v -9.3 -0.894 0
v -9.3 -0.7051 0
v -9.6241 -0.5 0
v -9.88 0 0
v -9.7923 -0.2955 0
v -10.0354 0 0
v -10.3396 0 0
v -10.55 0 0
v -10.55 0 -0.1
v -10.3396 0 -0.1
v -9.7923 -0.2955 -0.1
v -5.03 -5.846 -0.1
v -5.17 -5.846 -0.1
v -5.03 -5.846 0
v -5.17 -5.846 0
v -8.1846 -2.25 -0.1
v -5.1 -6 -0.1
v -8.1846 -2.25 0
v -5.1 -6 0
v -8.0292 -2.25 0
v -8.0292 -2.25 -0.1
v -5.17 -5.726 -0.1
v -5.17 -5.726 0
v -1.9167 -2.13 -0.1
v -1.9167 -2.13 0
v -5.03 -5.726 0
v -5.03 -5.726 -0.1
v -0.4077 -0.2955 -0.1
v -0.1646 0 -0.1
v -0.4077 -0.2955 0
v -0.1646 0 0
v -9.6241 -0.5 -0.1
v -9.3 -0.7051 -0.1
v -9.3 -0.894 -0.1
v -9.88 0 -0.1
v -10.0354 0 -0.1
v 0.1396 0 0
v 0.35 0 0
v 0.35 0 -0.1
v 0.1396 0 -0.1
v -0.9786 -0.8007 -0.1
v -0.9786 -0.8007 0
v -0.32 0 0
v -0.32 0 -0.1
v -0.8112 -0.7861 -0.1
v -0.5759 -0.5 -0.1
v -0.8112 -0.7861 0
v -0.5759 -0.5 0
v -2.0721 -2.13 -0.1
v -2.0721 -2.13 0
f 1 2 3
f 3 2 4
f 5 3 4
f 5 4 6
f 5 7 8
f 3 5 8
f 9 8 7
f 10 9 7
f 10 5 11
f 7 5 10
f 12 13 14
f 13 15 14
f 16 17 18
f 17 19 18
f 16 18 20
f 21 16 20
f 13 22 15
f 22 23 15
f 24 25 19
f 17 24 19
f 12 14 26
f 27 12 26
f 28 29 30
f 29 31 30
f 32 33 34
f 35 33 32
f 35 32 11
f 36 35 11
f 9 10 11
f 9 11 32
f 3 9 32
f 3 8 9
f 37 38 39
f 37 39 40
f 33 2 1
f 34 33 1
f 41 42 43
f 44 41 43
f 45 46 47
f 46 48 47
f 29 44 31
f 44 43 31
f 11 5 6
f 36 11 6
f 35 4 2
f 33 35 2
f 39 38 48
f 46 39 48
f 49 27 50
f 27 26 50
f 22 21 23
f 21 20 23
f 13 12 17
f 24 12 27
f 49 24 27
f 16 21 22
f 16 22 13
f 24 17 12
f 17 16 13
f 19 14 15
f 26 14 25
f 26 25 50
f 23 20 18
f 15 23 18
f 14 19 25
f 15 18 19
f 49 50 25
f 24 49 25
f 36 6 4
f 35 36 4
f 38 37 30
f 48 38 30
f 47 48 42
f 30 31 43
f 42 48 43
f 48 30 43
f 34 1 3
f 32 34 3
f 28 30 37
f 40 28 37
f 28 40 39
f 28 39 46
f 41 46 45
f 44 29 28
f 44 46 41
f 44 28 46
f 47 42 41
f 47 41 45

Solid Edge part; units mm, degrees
sketch "Sketch1" plane through (0, 0, 0) normal (0, 0, 1) x (1, 0, 0)
  line L0 (-9.3, -0.894) -> (-10.0354, 0)
  line L1 (-10.0354, 0) -> (-9.88, 0)
  line L2 (-9.88, 0) -> (-9.3, -0.7051)
  line L3 (-9.3, -0.7051) -> (-9.3, -0.894)
  line L4 (-0.32, 0) -> (-0.1646, 0)
  line L5 (-0.1646, 0) -> (-0.8112, -0.7861)
  line L6 (-0.9786, -0.8007) -> (-0.8112, -0.7861)
  line L7 (-0.9786, -0.8007) -> (-0.32, 0)
  line L8 (-1.9167, -2.13) -> (-5.1, -6)
  line L9 (-5.1, -6) -> (-8.1846, -2.25)
  line L10 (-8.1846, -2.25) -> (-8.0292, -2.25)
  line L11 (-8.0292, -2.25) -> (-5.17, -5.726)
  line L12 (-5.17, -5.726) -> (-5.17, -5.846)
  line L13 (-5.17, -5.846) -> (-5.03, -5.846)
  line L14 (-5.03, -5.846) -> (-5.03, -5.726)
  line L15 (-5.03, -5.726) -> (-2.0721, -2.13)
  line L16 (-2.0721, -2.13) -> (-1.9167, -2.13)
  dimension "D1" = 0.14
  dimension "D2" = 0.12
  dimension "D3" = 6
  dimension "D4" = 0.12
extrude "Protrusion1" add sketch "Sketch1" against normal blind 0.1
sketch "Sketch2" plane through (-5.1, -3, 0) normal (0, 0, 1) x (-0.6352626, 0.7722962, 0)
  line L0 (-0.8922, -5.3419) -> (-0.9433, -5.0821)
  line L1 (-1.1453, -6.1148) -> (-0.9433, -5.0821)
  line L2 (-1.1453, -6.1148) -> (-1.0116, -5.9523)
  line L3 (-0.8922, -5.3419) -> (-1.0116, -5.9523)
  line L4 (4.8047, 1.9058) -> (5.0695, 1.9058)
  line L5 (5.0695, 1.9058) -> (5.6454, 2.1407)
  line L6 (5.7791, 2.3032) -> (5.6454, 2.1407)
  line L7 (5.7791, 2.3032) -> (4.8047, 1.9058)
  dimension "D1" = 5.7791
extrude "Protrusion2" add sketch "Sketch2" against normal up to surface (0.1 mm away)
